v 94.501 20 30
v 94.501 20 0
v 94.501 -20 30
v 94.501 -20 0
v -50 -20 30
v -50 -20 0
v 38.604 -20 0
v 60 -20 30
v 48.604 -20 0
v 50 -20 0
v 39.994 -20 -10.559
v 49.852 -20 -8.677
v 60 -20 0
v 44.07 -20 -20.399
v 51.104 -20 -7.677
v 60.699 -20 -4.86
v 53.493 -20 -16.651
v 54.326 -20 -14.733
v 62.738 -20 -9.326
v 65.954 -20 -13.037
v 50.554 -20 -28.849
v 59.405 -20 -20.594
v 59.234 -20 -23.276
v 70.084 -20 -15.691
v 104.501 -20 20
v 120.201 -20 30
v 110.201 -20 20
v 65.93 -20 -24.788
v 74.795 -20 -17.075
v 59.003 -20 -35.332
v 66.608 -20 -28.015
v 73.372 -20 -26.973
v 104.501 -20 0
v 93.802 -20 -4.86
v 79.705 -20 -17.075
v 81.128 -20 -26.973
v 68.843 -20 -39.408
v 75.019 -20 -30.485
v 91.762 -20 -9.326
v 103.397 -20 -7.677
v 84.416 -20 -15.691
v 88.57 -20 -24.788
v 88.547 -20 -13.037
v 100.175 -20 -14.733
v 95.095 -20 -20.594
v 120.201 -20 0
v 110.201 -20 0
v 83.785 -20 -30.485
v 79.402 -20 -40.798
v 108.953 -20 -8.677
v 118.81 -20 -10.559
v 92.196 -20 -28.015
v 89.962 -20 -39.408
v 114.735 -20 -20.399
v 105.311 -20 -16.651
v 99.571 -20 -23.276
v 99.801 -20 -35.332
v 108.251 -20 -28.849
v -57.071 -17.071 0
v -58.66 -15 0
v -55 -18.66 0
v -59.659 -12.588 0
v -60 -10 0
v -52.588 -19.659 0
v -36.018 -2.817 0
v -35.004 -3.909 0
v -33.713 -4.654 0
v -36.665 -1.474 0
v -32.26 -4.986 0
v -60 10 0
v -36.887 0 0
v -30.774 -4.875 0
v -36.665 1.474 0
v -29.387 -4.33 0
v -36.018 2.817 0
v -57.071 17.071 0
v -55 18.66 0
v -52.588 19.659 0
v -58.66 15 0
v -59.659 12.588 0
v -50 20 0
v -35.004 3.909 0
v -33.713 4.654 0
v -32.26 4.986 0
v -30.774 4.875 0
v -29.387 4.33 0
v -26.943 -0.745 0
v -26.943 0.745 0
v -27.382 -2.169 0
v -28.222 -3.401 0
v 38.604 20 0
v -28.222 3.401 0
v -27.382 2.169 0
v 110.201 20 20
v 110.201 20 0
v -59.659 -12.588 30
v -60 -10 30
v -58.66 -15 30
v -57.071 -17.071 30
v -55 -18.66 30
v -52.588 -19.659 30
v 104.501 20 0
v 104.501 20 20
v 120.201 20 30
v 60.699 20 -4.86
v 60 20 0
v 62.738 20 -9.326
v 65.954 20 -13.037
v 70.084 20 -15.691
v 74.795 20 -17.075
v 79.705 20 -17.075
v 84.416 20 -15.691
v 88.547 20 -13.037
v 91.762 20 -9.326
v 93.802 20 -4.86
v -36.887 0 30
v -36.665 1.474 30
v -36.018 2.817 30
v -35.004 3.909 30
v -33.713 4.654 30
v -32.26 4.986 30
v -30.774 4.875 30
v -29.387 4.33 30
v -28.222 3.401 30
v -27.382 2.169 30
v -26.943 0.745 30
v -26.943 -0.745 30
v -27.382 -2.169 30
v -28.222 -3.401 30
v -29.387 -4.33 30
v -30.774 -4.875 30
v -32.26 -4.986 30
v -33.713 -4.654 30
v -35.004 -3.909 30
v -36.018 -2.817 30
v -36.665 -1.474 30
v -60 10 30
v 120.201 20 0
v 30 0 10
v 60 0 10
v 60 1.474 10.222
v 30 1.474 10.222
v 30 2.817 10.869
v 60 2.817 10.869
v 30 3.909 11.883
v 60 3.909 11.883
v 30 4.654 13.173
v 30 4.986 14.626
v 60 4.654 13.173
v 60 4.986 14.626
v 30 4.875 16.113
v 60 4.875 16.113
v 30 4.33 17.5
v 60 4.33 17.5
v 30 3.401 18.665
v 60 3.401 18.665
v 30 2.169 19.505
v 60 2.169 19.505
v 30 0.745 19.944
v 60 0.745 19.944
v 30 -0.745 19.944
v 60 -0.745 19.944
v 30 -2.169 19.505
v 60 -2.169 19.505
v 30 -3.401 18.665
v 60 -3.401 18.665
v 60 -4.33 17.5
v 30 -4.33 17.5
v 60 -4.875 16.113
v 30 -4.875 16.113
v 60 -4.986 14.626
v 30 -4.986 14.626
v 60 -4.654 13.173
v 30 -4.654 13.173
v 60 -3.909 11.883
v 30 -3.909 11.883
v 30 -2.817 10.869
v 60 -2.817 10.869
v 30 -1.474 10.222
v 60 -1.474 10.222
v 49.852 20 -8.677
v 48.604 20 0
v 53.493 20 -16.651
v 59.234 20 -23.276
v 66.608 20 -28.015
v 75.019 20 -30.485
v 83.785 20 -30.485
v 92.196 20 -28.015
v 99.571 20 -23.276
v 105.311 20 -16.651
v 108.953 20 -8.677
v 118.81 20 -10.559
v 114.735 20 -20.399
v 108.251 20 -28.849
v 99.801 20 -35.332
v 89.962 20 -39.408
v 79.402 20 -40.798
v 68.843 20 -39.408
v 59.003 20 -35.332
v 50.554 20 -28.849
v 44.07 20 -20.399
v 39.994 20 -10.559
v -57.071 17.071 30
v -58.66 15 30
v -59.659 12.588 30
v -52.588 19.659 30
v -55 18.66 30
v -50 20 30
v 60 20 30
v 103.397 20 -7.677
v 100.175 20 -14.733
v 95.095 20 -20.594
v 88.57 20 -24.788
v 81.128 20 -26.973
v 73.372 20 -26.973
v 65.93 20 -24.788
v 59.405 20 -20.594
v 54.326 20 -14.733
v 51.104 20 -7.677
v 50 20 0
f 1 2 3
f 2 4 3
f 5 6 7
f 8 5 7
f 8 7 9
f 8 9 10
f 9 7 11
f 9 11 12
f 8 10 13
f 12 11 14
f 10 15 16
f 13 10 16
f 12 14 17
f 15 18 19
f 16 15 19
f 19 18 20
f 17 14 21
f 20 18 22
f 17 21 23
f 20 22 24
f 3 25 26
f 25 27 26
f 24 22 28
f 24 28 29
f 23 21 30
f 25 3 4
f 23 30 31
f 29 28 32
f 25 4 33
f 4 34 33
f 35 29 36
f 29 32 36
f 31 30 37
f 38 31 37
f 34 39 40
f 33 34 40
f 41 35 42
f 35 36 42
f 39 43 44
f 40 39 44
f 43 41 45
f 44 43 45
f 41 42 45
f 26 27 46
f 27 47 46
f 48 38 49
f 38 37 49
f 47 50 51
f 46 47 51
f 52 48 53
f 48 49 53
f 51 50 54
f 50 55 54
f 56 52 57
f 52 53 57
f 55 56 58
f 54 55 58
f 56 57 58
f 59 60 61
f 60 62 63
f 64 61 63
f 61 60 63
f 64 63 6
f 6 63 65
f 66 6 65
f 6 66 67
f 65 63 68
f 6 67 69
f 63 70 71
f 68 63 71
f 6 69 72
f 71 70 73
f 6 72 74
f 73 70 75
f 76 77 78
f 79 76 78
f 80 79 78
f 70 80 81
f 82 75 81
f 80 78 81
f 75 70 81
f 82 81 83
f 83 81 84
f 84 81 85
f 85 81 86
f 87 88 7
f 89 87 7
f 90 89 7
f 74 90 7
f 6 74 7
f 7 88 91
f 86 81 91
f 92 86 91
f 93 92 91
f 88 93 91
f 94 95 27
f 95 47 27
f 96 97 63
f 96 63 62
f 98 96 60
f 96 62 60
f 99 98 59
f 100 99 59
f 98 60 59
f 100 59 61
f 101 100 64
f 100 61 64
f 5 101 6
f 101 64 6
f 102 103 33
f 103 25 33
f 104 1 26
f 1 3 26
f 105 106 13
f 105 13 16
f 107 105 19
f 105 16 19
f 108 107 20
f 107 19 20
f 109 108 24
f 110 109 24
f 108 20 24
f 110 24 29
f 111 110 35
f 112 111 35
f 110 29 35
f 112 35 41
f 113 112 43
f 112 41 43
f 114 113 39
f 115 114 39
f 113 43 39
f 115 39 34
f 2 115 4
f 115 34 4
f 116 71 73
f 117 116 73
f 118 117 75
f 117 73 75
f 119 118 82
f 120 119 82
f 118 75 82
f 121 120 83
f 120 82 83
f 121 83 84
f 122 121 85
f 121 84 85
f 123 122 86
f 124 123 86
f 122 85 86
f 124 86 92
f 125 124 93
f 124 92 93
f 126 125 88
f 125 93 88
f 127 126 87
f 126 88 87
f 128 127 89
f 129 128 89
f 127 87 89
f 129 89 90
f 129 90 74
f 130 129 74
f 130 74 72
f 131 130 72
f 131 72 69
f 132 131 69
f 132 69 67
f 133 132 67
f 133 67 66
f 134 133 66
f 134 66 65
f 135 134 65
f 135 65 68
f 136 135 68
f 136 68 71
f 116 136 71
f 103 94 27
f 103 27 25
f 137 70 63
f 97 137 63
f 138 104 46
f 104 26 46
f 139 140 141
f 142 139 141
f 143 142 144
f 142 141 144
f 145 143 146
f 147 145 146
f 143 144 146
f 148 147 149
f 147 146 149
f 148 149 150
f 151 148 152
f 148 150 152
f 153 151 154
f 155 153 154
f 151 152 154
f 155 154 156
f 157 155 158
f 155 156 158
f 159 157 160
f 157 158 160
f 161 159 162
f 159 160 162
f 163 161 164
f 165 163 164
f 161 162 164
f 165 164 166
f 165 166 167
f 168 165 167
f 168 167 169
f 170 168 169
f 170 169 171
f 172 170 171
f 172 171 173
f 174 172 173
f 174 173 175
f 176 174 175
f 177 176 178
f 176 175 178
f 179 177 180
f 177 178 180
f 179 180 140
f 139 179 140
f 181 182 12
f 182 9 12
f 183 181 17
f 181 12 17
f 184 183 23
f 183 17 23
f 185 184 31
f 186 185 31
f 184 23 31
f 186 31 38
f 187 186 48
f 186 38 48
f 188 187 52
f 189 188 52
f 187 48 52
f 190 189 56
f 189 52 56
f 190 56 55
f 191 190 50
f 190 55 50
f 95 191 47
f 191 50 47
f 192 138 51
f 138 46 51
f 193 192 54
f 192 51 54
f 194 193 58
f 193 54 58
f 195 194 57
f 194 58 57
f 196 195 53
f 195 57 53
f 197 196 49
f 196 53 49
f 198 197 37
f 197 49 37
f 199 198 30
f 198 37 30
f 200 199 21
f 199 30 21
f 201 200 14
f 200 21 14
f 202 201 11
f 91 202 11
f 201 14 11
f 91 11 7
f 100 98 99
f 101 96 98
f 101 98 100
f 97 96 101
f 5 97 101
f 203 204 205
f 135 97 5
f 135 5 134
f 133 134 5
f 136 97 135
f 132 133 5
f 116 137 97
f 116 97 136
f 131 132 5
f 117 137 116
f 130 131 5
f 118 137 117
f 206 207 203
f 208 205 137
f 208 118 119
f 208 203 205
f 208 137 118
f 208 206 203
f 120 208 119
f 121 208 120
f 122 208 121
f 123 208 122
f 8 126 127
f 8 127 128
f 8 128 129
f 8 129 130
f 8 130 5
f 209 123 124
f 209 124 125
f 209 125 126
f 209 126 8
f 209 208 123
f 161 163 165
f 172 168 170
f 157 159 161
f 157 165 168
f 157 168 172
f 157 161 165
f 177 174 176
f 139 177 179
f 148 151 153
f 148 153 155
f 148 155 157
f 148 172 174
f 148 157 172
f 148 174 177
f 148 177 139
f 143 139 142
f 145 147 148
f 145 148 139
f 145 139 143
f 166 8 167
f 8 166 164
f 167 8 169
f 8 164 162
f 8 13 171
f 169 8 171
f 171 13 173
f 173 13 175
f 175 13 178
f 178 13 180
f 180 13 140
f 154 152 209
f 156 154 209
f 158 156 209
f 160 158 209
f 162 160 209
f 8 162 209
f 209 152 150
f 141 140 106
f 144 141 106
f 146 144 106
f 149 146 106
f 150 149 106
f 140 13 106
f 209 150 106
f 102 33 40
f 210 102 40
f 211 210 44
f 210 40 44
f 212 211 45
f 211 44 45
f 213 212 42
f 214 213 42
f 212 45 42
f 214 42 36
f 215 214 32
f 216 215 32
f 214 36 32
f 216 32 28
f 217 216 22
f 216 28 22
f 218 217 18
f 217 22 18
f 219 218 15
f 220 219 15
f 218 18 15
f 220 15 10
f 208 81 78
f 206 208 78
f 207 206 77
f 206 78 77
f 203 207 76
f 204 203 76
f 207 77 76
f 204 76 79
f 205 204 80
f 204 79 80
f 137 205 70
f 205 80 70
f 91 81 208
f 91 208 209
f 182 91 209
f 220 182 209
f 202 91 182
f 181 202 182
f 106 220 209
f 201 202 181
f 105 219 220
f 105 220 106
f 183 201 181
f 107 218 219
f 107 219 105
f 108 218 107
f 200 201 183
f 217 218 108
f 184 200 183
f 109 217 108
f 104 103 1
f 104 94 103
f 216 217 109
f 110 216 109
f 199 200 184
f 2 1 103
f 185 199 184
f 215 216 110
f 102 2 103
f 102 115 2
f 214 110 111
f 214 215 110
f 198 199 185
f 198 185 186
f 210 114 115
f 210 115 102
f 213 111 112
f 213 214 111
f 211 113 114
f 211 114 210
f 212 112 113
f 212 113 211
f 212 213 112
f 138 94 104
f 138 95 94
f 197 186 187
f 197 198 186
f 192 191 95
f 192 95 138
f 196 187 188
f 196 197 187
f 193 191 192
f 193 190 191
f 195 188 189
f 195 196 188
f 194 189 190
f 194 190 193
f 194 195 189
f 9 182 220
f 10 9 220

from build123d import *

# Parameters (mm, degrees)
BOSS_EXTRU_1_DEPTH      = 30
ESQUISSE3_R             = 5
ENL_V_MAT_EXTRU_1_DEPTH = 40
ESQUISSE4_R             = 5
ENL_V_MAT_EXTRU_2_DEPTH = 30
EXTRU_MINCE1_DEPTH      = 20


with BuildPart() as part:
    # Esquisse1 → Boss.-Extru.1 (new body)
    with BuildSketch(Plane.XY):
        with BuildLine():
            Line((-50, -20), (60, -20))
            Line((60, -20), (60, 20))
            Line((60, 20), (-50, 20))
            ThreePointArc((-50, 20), (-57.071067812, 17.071067812), (-60, 10))
            Line((-60, 10), (-60, -10))
            ThreePointArc((-60, -10), (-57.071067812, -17.071067812), (-50, -20))
        make_face()
    extrude(amount=BOSS_EXTRU_1_DEPTH)

    # Esquisse3 → Enlèv. mat.-Extru.1 (cut)
    with BuildSketch(Plane(origin=(0, 0, 0), x_dir=(-1, 0, 0), z_dir=(0, 0, -1))):
        with Locations((31.886780036, 0)):
            Circle(ESQUISSE3_R)
    extrude(amount=-ENL_V_MAT_EXTRU_1_DEPTH, mode=Mode.SUBTRACT)

    # Esquisse4 → Enlèv. mat.-Extru.2 (cut)
    with BuildSketch(Plane(origin=(60, 0, 0), x_dir=(0, 0, -1), z_dir=(1, 0, 0))):
        with Locations((-15, 0)):
            Circle(ESQUISSE4_R)
    extrude(amount=-ENL_V_MAT_EXTRU_2_DEPTH, mode=Mode.SUBTRACT)

    # Esquisse11 → Extru.-Mince1 (add, symmetric)
    with BuildSketch(Plane(origin=(0, 0, 0), x_dir=(-1, 0, 0), z_dir=(0, -1, 0))):
        with BuildLine():
            ThreePointArc((-60, 0), (-77.250281864, 17.250281864), (-94.500563727, 0))
            Line((-94.500563727, 0), (-94.500563727, -30))
            Line((-94.500563727, -30), (-120.200563727, -30))
            Line((-120.200563727, -30), (-120.200563727, 0))
            ThreePointArc((-120.200563727, 0), (-79.40232614, 40.798237588), (-38.604088552, 0))
            Line((-38.604088552, 0), (-48.604088552, 0))
            ThreePointArc((-48.604088552, 0), (-79.40232614, 30.798237588), (-110.200563727, 0))
            Line((-110.200563727, 0), (-110.200563727, -20))
            Line((-110.200563727, -20), (-104.500563727, -20))
            Line((-104.500563727, -20), (-104.500563727, 0))
            ThreePointArc((-104.500563727, 0), (-77.250281864, 27.250281864), (-50, 0))
            Line((-50, 0), (-60, 0))
        make_face()
    extrude(amount=EXTRU_MINCE1_DEPTH, both=True)


solid = part.part
